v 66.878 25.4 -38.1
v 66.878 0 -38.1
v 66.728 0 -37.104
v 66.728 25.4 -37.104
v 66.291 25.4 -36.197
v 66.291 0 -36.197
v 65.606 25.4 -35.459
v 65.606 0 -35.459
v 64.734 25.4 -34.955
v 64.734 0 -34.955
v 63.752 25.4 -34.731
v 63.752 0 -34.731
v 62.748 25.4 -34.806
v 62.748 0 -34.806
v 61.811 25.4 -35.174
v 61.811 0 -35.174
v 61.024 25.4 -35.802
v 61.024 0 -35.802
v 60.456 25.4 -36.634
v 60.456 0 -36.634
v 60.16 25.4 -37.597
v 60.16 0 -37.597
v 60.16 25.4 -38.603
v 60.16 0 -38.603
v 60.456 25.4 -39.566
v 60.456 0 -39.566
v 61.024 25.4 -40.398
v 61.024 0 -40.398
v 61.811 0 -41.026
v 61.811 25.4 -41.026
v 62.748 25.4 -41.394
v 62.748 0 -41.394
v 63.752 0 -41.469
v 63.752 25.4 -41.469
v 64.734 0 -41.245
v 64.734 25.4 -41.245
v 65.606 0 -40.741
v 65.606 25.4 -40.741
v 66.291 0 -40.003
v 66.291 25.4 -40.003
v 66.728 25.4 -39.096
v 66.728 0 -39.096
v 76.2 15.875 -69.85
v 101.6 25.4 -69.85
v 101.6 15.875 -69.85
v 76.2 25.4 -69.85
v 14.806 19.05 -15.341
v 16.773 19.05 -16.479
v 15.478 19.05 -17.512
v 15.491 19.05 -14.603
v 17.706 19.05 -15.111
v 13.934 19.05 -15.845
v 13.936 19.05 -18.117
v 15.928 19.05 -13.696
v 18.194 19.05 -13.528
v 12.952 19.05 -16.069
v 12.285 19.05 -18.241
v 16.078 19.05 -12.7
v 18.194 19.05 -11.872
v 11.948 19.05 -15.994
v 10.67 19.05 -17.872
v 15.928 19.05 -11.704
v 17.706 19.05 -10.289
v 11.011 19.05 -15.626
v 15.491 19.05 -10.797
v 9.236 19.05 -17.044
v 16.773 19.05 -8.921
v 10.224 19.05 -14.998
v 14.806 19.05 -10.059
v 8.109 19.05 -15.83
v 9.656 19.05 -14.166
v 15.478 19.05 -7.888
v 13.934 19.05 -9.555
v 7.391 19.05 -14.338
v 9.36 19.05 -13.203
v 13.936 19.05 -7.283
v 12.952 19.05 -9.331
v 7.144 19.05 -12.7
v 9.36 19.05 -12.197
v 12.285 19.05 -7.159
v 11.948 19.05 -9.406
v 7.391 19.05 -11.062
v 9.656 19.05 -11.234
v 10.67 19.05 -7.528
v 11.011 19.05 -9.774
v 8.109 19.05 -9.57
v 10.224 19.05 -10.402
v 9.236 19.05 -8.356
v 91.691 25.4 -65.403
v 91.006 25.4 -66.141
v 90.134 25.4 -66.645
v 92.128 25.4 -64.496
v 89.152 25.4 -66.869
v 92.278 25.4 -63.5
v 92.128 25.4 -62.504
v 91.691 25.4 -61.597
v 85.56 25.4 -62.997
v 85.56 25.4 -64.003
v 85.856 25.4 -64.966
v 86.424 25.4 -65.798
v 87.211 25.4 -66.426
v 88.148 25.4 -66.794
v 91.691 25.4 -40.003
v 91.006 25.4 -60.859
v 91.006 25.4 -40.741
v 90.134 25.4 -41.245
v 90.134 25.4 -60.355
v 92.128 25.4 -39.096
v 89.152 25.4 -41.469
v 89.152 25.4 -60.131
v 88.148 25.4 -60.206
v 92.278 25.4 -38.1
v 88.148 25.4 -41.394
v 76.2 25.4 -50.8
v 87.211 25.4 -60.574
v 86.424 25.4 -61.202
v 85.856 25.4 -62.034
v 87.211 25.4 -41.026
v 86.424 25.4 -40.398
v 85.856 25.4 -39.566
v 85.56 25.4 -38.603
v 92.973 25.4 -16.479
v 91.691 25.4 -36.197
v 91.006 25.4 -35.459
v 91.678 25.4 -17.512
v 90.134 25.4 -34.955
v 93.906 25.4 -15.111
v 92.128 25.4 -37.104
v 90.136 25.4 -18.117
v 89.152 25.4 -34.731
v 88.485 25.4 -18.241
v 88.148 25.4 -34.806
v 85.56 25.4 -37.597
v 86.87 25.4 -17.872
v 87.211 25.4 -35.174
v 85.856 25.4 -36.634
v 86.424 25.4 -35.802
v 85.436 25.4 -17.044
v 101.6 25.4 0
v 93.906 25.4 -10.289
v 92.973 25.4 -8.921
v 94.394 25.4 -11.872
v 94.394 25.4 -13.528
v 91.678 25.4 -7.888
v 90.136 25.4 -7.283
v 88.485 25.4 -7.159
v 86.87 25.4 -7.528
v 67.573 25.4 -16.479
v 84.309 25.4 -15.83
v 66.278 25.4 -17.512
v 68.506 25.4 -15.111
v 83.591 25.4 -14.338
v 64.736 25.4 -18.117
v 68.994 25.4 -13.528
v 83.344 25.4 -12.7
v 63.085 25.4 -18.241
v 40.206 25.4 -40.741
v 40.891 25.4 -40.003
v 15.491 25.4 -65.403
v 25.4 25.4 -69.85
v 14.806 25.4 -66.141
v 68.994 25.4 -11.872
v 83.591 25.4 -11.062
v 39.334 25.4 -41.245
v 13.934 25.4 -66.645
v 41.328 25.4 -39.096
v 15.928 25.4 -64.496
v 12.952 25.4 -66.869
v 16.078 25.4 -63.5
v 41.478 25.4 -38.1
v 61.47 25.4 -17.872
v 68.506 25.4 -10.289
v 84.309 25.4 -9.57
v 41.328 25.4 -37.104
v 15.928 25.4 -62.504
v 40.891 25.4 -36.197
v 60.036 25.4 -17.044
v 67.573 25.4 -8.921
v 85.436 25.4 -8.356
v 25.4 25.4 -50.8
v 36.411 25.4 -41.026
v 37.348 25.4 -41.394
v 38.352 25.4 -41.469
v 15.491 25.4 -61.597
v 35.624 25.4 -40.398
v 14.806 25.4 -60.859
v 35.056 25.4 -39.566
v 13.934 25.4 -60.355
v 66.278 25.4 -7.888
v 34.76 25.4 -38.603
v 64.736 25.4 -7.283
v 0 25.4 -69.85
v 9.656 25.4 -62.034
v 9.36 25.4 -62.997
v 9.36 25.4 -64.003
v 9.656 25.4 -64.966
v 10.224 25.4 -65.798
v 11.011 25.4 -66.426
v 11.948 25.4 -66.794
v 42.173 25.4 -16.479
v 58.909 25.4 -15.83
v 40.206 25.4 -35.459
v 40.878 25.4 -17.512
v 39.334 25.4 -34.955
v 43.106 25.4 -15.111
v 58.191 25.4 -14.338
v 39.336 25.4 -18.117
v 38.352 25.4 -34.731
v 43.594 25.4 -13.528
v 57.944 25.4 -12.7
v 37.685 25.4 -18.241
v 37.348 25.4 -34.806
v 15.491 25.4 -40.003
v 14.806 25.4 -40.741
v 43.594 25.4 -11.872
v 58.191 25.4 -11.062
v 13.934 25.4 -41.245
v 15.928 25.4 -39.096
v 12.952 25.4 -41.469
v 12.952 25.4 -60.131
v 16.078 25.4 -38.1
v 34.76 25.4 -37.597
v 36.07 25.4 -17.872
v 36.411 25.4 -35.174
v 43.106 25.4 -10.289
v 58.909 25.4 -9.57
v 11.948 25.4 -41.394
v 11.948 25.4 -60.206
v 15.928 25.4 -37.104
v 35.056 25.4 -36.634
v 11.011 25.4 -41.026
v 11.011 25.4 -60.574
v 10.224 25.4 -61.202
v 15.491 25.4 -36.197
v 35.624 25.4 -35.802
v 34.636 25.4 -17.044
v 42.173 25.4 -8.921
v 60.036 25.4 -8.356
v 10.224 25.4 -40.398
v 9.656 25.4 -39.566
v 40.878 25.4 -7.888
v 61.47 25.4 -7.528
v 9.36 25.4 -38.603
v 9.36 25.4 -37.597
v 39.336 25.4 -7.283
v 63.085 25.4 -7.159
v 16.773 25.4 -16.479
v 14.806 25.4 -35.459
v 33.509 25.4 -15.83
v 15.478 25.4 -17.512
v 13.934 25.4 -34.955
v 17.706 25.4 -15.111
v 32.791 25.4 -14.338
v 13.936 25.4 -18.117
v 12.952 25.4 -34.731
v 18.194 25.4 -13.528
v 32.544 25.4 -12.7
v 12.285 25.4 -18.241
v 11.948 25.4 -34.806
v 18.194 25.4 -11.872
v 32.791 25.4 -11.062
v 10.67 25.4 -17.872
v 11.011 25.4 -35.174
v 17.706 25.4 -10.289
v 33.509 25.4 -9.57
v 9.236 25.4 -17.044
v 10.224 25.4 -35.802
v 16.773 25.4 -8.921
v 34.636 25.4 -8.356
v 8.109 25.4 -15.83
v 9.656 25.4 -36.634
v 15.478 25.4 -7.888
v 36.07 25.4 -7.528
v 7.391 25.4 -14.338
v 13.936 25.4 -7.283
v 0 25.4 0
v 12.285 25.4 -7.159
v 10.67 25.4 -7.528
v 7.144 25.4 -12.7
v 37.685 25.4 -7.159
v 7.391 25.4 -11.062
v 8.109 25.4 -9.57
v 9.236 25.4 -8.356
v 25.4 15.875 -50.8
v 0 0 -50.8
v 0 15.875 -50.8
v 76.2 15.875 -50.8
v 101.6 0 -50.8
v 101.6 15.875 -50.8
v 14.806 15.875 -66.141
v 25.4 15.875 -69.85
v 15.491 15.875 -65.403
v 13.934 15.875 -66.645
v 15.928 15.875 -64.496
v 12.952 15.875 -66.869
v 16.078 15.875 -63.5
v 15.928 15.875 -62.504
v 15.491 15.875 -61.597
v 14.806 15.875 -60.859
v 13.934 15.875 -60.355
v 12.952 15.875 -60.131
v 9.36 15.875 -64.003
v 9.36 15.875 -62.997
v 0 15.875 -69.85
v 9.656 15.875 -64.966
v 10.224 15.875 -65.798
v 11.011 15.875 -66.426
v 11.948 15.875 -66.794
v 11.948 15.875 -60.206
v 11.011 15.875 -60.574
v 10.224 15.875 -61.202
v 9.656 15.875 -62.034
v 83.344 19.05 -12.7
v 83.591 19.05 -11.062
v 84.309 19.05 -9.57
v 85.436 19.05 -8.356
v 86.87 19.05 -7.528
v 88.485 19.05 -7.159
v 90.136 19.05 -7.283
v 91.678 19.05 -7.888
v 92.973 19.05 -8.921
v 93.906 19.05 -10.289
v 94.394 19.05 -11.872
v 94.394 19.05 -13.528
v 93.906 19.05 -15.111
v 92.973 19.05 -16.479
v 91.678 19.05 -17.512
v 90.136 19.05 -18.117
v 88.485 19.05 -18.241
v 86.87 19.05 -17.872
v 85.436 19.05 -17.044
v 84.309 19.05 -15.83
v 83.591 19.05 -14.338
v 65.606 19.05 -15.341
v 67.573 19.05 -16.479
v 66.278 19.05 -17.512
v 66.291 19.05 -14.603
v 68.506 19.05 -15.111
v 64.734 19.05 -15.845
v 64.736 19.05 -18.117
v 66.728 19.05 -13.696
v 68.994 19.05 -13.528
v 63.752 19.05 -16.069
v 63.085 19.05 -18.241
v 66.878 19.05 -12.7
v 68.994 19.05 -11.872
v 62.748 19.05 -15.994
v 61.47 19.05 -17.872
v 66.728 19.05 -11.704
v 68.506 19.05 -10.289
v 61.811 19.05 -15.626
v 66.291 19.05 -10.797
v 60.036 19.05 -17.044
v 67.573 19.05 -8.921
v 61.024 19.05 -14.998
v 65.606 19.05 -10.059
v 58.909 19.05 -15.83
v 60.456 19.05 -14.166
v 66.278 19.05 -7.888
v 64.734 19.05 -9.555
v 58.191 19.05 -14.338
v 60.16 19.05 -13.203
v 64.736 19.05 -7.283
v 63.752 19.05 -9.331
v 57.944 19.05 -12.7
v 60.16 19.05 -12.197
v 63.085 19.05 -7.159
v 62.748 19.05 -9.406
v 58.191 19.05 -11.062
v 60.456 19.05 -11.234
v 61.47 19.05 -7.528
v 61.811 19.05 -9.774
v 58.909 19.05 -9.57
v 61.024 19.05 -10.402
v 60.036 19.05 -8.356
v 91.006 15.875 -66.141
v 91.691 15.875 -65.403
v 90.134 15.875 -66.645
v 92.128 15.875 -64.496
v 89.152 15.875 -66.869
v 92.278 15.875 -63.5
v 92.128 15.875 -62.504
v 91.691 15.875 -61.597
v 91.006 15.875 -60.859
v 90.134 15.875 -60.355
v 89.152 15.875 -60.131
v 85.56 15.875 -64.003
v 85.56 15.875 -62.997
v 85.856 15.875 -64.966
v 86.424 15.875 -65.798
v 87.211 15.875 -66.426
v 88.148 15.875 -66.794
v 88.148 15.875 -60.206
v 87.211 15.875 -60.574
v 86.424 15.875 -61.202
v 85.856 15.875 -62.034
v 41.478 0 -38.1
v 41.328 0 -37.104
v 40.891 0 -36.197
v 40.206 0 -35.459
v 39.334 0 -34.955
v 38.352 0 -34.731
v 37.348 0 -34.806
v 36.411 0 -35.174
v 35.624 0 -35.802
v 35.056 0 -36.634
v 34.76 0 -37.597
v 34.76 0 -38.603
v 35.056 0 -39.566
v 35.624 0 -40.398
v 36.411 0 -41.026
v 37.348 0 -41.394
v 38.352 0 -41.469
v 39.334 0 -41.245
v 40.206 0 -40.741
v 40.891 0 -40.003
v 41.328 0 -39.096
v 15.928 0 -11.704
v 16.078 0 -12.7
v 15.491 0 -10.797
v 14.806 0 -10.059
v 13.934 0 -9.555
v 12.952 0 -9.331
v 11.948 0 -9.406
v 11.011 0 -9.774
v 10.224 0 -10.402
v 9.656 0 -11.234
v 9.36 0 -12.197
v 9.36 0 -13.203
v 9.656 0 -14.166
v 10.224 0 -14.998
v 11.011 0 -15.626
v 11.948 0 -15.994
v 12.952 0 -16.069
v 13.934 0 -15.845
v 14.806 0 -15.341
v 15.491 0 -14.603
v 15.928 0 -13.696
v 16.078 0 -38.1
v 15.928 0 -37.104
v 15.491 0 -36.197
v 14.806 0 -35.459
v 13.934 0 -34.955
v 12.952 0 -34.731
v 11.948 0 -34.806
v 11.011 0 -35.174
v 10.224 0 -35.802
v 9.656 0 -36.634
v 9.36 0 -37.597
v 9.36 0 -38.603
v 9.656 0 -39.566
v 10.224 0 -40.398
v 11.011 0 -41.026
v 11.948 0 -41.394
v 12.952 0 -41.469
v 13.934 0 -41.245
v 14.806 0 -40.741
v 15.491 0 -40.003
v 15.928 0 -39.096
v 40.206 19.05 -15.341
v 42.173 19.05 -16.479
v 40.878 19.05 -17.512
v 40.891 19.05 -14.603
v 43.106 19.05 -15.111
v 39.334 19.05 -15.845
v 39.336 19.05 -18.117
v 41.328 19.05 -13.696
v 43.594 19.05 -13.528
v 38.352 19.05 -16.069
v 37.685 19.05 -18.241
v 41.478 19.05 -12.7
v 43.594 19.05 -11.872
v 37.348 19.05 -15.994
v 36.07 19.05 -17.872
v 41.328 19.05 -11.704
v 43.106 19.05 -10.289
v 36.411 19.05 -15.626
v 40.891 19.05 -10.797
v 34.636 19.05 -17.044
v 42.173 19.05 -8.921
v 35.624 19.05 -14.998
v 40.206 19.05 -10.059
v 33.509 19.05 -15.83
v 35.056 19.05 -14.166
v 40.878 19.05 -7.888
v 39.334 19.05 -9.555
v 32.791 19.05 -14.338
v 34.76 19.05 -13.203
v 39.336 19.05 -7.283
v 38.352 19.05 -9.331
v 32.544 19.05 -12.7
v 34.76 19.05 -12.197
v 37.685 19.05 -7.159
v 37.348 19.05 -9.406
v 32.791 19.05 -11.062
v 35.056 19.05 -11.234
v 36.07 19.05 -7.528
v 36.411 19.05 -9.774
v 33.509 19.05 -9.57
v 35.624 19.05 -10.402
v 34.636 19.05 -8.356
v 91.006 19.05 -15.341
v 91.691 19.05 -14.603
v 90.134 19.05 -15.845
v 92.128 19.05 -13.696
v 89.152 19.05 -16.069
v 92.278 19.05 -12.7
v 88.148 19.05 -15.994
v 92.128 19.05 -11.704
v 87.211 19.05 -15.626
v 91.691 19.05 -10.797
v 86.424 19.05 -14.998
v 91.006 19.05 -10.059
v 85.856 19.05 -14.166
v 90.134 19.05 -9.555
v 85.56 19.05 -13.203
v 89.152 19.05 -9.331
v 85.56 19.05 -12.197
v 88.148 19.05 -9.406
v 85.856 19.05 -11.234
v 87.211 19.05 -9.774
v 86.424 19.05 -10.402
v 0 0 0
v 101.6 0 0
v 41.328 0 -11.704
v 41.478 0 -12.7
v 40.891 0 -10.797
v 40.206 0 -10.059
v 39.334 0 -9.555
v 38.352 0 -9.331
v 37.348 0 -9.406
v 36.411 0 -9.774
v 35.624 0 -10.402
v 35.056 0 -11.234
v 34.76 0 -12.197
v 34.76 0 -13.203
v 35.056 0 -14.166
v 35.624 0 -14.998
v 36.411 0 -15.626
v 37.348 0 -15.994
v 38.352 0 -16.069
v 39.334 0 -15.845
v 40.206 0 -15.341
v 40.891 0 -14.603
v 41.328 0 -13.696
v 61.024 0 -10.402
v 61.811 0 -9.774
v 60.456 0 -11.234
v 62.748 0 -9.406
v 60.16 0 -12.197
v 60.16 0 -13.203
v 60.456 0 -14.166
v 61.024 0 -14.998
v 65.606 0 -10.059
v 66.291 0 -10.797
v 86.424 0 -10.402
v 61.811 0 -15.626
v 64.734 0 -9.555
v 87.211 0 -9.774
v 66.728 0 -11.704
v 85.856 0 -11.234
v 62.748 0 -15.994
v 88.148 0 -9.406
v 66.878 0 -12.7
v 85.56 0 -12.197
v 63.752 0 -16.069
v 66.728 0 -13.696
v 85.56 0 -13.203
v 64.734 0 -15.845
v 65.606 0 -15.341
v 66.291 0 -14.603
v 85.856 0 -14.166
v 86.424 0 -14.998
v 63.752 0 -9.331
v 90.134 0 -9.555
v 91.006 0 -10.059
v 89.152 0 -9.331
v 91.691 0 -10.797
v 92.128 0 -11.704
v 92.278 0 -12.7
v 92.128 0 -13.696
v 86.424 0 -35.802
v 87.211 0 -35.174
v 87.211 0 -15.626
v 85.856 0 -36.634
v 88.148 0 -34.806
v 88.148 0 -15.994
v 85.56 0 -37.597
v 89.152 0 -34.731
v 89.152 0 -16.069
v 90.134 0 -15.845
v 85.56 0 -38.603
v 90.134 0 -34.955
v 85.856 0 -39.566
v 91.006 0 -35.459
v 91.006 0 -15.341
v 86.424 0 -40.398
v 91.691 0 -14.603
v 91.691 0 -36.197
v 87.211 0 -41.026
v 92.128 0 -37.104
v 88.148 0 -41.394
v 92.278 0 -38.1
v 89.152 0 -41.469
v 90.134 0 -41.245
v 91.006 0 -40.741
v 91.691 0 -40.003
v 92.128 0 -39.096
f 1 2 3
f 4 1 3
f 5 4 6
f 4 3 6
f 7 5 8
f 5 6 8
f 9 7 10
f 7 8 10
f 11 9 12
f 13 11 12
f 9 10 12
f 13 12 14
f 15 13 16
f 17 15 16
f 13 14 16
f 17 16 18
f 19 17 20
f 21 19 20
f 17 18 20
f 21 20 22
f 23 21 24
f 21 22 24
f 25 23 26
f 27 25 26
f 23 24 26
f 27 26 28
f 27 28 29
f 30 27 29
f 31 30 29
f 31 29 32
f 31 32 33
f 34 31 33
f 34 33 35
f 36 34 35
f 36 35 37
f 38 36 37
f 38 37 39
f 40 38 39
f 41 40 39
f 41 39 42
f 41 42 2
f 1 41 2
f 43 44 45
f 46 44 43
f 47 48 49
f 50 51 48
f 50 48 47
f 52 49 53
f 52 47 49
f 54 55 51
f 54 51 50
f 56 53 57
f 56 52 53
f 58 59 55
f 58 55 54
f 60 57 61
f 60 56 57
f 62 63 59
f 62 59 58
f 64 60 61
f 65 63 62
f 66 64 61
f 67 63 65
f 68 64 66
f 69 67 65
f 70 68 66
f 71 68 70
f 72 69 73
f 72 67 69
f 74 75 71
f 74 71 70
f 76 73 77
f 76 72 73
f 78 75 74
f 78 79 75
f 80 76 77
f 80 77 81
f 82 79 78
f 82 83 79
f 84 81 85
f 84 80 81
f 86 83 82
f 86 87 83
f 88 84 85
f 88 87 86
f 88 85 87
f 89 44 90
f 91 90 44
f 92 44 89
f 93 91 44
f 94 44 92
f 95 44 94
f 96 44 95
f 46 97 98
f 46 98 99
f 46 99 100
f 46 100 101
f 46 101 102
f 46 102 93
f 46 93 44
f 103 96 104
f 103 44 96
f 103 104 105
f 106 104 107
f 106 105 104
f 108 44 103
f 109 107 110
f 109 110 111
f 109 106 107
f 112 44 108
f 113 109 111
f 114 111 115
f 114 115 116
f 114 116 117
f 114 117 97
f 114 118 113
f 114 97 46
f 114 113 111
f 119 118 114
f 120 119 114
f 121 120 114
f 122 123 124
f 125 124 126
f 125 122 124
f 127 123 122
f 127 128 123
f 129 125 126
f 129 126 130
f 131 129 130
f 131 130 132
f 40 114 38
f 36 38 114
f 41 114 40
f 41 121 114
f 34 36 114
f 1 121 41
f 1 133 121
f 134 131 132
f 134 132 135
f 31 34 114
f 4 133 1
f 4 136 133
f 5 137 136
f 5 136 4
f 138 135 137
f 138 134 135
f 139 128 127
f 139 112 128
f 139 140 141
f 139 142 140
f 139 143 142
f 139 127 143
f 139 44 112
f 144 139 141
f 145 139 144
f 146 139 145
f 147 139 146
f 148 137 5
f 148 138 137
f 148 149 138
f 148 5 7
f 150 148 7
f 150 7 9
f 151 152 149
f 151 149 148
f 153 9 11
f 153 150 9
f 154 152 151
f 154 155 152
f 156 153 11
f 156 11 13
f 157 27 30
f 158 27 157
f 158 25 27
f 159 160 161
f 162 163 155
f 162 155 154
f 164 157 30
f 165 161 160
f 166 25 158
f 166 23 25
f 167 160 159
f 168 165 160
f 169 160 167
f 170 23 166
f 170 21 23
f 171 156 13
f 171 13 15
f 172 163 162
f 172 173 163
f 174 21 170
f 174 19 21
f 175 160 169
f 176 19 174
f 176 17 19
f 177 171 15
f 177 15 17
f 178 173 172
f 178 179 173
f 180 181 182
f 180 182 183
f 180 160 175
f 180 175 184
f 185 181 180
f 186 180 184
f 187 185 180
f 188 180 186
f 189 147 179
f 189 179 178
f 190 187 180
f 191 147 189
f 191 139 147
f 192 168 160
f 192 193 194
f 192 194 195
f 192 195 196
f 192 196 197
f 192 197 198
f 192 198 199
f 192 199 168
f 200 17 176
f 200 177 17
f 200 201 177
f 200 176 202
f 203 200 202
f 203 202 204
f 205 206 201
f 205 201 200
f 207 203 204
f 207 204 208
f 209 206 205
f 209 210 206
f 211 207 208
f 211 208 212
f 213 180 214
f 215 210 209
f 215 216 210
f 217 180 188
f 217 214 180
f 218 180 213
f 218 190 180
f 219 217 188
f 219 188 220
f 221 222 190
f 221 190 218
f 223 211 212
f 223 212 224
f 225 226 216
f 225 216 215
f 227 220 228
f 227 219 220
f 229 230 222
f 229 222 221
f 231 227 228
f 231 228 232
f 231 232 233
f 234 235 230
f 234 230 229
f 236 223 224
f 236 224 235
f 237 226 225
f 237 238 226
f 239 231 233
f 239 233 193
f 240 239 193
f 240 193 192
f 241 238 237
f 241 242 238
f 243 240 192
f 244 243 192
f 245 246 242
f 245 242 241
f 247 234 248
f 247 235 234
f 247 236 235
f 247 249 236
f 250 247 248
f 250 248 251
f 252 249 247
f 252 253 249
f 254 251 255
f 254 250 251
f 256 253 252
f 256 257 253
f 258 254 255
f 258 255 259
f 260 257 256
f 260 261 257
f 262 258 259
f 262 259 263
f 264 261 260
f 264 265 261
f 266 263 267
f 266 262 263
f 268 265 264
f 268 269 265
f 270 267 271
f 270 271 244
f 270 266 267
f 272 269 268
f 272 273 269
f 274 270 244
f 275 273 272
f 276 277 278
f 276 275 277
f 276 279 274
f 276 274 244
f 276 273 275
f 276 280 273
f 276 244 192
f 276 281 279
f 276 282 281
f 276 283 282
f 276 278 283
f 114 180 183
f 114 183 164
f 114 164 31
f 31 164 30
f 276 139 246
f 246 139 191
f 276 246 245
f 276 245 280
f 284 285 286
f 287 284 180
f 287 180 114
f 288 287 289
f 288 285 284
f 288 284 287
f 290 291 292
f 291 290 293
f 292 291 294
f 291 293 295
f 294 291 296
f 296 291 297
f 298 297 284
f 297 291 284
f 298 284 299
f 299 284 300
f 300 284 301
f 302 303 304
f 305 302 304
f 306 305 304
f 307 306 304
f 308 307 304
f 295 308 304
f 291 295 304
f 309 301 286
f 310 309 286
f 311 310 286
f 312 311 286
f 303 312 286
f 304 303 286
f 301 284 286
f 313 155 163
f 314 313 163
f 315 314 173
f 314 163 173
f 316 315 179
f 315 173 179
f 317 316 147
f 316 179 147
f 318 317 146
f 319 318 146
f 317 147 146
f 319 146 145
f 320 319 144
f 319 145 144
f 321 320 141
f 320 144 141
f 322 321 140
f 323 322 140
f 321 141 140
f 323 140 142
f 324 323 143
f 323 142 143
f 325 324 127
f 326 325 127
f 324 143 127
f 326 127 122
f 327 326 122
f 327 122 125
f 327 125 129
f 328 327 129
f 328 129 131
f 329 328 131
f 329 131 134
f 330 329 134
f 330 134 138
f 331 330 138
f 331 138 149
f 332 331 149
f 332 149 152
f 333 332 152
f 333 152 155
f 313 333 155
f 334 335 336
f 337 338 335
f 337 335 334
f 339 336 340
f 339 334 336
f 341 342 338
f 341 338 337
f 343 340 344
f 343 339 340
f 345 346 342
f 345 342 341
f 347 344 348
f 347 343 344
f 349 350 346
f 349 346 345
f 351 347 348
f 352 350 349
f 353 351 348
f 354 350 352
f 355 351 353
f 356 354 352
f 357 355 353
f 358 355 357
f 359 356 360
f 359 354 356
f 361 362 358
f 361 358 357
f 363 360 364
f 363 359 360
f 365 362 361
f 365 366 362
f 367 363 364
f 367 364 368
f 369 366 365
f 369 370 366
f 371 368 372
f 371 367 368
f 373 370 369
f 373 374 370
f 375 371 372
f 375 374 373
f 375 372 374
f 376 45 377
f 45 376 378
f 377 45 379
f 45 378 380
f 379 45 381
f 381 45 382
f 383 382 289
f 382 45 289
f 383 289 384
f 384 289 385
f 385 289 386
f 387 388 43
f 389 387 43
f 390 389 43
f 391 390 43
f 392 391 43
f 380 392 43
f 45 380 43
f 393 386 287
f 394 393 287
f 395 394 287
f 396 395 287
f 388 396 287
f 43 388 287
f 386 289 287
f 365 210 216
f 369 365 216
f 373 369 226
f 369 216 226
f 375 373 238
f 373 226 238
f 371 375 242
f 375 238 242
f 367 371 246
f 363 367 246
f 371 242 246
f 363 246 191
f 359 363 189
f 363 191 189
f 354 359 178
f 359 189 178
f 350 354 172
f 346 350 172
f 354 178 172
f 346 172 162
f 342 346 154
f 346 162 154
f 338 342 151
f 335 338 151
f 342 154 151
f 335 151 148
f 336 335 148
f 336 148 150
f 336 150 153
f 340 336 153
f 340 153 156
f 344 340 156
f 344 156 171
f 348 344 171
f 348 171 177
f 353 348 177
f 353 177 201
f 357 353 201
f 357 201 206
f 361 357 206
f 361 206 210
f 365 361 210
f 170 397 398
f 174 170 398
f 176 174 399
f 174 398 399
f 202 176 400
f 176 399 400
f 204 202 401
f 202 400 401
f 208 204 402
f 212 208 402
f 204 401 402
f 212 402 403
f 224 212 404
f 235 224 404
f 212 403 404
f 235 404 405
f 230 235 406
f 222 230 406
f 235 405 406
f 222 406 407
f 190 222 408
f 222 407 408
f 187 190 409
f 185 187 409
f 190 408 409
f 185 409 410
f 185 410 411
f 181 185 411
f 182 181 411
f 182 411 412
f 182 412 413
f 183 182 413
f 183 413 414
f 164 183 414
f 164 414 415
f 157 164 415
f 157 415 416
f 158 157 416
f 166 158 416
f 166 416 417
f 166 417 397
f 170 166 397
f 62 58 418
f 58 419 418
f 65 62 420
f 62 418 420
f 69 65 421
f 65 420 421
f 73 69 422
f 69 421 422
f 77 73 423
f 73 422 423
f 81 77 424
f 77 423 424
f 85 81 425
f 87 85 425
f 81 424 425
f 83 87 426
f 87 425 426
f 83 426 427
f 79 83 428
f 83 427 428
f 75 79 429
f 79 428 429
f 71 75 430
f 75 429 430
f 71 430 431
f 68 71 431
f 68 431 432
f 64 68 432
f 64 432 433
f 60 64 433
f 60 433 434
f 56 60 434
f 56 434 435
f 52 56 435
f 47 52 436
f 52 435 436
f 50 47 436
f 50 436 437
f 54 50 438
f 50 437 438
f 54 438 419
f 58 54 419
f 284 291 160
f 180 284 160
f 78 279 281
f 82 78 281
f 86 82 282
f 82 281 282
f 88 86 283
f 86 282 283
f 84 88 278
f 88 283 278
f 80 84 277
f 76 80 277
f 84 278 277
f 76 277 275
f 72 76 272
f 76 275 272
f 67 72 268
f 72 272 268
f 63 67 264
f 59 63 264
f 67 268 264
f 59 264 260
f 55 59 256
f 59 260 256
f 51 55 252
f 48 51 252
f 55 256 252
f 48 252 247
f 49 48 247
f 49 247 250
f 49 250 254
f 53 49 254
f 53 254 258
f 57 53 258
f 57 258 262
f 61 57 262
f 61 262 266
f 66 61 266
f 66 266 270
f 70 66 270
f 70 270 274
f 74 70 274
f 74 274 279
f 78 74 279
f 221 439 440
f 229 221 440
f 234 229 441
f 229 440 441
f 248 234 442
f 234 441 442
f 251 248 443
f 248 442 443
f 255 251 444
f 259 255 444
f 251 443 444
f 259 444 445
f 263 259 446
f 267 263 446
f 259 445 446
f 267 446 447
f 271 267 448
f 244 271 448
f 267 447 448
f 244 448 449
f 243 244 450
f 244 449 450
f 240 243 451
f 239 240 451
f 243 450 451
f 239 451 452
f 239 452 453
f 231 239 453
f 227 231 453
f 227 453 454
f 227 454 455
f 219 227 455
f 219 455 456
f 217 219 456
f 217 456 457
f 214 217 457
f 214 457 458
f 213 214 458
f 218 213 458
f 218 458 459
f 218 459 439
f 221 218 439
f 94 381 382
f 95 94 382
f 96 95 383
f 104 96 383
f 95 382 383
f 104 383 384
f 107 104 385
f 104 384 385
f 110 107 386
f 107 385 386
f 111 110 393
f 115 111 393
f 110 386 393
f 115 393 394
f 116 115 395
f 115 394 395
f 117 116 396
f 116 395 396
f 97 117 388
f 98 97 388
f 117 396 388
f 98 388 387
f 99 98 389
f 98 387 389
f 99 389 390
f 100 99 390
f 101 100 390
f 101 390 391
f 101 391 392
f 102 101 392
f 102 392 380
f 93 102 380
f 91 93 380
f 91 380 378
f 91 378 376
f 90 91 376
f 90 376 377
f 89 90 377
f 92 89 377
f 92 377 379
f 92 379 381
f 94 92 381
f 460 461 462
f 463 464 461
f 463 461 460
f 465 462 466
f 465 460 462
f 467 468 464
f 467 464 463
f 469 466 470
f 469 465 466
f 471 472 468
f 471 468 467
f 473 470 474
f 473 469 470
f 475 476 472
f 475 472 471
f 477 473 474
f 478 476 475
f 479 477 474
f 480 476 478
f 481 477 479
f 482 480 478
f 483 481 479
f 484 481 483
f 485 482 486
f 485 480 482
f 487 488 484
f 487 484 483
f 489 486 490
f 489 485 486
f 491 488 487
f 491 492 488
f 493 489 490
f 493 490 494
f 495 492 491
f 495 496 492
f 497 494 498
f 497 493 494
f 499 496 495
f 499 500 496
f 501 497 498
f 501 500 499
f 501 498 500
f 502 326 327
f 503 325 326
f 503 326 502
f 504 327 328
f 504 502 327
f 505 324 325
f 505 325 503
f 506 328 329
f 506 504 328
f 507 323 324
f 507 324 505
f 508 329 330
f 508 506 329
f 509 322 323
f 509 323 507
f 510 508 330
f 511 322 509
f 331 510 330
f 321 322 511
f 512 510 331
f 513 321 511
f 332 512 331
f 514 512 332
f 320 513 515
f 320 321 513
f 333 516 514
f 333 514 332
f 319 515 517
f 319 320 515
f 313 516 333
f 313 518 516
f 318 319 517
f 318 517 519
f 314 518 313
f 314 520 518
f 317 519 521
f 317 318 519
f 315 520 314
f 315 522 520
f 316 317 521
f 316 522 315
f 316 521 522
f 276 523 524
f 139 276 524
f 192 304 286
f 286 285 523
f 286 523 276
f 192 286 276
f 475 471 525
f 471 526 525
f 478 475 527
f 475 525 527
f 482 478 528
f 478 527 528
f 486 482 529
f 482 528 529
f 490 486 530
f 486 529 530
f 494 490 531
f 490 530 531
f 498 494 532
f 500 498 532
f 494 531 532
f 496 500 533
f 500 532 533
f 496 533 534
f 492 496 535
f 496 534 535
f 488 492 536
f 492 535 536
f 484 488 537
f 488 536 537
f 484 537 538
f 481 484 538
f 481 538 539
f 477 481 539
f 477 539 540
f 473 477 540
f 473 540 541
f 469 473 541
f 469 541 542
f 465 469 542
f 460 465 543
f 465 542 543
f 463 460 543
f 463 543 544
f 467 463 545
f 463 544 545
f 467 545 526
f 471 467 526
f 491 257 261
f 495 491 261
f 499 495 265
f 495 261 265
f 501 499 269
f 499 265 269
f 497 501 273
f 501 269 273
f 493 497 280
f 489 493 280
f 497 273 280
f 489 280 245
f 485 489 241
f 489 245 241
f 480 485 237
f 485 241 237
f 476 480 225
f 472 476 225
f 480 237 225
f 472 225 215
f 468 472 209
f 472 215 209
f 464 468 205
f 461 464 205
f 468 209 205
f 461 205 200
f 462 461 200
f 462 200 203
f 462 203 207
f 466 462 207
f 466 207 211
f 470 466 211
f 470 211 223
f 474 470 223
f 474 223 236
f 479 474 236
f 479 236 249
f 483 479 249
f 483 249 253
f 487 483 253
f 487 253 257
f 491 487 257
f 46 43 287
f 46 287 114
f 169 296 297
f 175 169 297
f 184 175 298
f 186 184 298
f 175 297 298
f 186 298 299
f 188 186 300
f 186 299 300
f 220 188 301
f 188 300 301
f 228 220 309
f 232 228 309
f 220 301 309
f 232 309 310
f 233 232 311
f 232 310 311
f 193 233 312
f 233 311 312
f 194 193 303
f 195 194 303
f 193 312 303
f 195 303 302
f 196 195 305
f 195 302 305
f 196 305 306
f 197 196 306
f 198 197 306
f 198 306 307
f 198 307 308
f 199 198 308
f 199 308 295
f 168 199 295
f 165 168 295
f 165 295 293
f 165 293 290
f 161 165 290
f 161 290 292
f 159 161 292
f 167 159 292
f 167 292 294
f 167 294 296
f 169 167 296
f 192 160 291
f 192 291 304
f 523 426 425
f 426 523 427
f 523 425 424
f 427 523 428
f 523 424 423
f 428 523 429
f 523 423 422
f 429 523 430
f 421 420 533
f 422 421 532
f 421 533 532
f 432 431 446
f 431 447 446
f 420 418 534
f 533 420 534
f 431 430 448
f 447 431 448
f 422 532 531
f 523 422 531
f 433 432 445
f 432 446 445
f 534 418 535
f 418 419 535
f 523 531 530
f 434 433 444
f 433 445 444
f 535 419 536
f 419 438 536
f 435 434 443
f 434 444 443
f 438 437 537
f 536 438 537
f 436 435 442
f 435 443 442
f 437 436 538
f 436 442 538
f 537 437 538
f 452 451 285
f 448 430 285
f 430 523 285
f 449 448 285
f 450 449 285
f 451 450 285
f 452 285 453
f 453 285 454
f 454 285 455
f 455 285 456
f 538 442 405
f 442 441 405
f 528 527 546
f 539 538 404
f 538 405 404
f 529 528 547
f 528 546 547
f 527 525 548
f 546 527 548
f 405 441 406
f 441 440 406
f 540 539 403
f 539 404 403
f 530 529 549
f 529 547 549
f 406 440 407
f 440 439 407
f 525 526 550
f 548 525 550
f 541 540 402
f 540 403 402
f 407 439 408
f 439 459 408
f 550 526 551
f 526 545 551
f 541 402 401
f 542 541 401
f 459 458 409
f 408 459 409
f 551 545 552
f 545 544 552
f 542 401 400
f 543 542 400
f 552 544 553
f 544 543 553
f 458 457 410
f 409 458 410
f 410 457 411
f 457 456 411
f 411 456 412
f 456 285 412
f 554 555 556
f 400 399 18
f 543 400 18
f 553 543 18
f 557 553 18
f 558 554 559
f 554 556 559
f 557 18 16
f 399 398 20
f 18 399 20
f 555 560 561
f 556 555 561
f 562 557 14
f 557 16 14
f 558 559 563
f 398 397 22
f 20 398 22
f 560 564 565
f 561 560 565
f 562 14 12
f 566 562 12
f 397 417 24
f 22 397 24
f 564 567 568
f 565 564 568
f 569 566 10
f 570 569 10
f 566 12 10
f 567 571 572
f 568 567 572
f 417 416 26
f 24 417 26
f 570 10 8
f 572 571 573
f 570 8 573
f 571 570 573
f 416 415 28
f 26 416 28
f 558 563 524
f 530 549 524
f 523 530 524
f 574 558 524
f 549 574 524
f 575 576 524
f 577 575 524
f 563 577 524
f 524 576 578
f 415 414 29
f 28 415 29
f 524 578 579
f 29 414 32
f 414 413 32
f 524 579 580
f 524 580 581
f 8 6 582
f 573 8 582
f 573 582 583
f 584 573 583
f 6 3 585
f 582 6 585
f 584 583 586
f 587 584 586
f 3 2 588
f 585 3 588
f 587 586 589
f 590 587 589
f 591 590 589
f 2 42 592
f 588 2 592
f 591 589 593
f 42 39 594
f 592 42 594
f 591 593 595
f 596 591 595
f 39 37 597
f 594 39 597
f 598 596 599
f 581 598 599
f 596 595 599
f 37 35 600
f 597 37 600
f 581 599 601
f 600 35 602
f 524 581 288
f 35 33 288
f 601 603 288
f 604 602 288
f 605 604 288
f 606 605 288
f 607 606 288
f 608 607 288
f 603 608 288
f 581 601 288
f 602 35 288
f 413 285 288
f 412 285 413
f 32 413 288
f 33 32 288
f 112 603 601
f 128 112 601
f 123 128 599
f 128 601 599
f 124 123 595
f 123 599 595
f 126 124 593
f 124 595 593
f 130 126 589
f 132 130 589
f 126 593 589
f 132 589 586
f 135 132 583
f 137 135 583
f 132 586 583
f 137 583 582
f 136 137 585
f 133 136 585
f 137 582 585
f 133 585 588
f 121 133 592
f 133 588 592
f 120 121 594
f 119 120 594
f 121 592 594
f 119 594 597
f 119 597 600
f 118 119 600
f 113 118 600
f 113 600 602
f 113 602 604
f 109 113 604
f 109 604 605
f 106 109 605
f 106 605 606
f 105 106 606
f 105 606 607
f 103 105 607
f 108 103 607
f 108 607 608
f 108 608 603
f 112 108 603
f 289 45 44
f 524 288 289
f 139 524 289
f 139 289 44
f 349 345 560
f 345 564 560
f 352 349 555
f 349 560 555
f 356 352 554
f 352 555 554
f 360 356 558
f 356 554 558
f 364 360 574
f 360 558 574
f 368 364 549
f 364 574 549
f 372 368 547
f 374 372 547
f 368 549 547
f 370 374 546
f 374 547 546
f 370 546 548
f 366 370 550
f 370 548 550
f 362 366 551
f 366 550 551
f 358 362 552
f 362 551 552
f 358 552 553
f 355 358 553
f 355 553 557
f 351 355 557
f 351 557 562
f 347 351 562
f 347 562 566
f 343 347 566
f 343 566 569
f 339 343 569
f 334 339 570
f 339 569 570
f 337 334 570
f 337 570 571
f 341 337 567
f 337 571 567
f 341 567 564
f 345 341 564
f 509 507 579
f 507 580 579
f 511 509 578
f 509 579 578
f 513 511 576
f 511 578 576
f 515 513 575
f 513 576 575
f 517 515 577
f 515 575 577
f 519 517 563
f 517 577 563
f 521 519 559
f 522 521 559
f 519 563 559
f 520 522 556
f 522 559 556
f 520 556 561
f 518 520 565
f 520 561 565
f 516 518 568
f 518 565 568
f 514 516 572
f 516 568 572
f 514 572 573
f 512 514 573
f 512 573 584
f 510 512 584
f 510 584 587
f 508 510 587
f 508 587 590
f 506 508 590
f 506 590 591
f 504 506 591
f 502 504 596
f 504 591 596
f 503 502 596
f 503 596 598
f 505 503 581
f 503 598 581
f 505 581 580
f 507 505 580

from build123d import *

# Parameters (mm, degrees)
SKETCH1_W                                        = 101.6
SKETCH1_H                                        = 50.8
BOSS_EXTRUDE1_DEPTH                              = 25.4
CBORE_FOR_1_4_SOCKET_HEAD_CAP_SCREW1_D           = 6.7564
CBORE_FOR_1_4_SOCKET_HEAD_CAP_SCREW1_CBORE_D     = 11.1125
CBORE_FOR_1_4_SOCKET_HEAD_CAP_SCREW1_CBORE_DEPTH = 6.35
LPATTERN1_COUNT                                  = 4
LPATTERN1_PITCH                                  = 25.4
F_1_4_CLEARANCE_HOLE1_D                          = 6.7564
LPATTERN2_COUNT                                  = 4
LPATTERN2_PITCH                                  = 25.4
SKETCH7_W                                        = 101.6
SKETCH7_H                                        = 9.525
BOSS_EXTRUDE2_DEPTH                              = 19.05
SKETCH8_W                                        = 50.8
SKETCH8_H                                        = 9.525
CUT_EXTRUDE1_DEPTH                               = 19.05
LPATTERN3_COUNT                                  = 2
LPATTERN3_PITCH                                  = 25.4
LPATTERN4_COPY_1_D                               = 6.7564
LPATTERN4_COPY_2_D                               = 6.7564


with BuildPart() as part:
    # Sketch1 → Boss-Extrude1 (new body)
    with BuildSketch(Plane(origin=(0, 0, 0), x_dir=(1, 0, 0), z_dir=(0, 1, 0))):
        with Locations((50.8, 25.4)):
            Rectangle(SKETCH1_W, SKETCH1_H)
    extrude(amount=BOSS_EXTRUDE1_DEPTH)

    # CBORE for 1/4 Socket Head Cap Screw1 (through all)
    with Locations(Plane(origin=(0, 25.4, 0), x_dir=(-1, 0, 0), z_dir=(0, 1, 0))):
        with Locations((-12.7, -12.7)):
            cbore_for_1_4_socket_head_cap_screw1 = CounterBoreHole(CBORE_FOR_1_4_SOCKET_HEAD_CAP_SCREW1_D / 2, CBORE_FOR_1_4_SOCKET_HEAD_CAP_SCREW1_CBORE_D / 2, CBORE_FOR_1_4_SOCKET_HEAD_CAP_SCREW1_CBORE_DEPTH)

    # LPattern1: CBORE for 1/4 Socket Head Cap Screw1 ×4
    with Locations(*[(i * LPATTERN1_PITCH, 0, 0) for i in range(1, LPATTERN1_COUNT)]):
        add(cbore_for_1_4_socket_head_cap_screw1, mode=Mode.SUBTRACT)

    # 1/4 Clearance Hole1 (through all)
    with Locations(Plane(origin=(0, 25.4, 0), x_dir=(-1, 0, 0), z_dir=(0, 1, 0))):
        with Locations((-12.7, -38.1)):
            f_1_4_clearance_hole1 = Hole(F_1_4_CLEARANCE_HOLE1_D / 2)

    # LPattern2: 1/4 Clearance Hole1 ×4
    with Locations(*[(i * LPATTERN2_PITCH, 0, 0) for i in range(1, LPATTERN2_COUNT)]):
        add(f_1_4_clearance_hole1, mode=Mode.SUBTRACT)

    # Sketch7 → Boss-Extrude2 (add)
    with BuildSketch(Plane(origin=(0, 0, -50.8), x_dir=(-1, 0, 0), z_dir=(0, 0, -1))):
        with Locations((-50.8, 20.6375)):
            Rectangle(SKETCH7_W, SKETCH7_H)
    extrude(amount=BOSS_EXTRUDE2_DEPTH)

    # Sketch8 → Cut-Extrude1 (cut)
    with BuildSketch(Plane(origin=(0, 0, -69.85), x_dir=(-1, 0, 0), z_dir=(0, 0, -1))):
        with Locations((-50.8, 20.6375)):
            Rectangle(SKETCH8_W, SKETCH8_H)
    extrude(amount=-CUT_EXTRUDE1_DEPTH, mode=Mode.SUBTRACT)

    # LPattern3: 1/4 Clearance Hole1 ×2
    with Locations(*[(0, 0, -i * LPATTERN3_PITCH) for i in range(1, LPATTERN3_COUNT)]):
        add(f_1_4_clearance_hole1, mode=Mode.SUBTRACT)

    # LPattern4 copy 1 (through all)
    with Locations(Plane(origin=(76.2, 25.4, -25.4), x_dir=(-1, 0, 0), z_dir=(0, 1, 0))):
        with Locations((-12.7, -38.1)):
            Hole(LPATTERN4_COPY_1_D / 2)

    # LPattern4 copy 2 (through all)
    with Locations(Plane(origin=(76.2, 25.4, 0), x_dir=(-1, 0, 0), z_dir=(0, 1, 0))):
        with Locations((-12.7, -38.1)):
            Hole(LPATTERN4_COPY_2_D / 2)


solid = part.part
